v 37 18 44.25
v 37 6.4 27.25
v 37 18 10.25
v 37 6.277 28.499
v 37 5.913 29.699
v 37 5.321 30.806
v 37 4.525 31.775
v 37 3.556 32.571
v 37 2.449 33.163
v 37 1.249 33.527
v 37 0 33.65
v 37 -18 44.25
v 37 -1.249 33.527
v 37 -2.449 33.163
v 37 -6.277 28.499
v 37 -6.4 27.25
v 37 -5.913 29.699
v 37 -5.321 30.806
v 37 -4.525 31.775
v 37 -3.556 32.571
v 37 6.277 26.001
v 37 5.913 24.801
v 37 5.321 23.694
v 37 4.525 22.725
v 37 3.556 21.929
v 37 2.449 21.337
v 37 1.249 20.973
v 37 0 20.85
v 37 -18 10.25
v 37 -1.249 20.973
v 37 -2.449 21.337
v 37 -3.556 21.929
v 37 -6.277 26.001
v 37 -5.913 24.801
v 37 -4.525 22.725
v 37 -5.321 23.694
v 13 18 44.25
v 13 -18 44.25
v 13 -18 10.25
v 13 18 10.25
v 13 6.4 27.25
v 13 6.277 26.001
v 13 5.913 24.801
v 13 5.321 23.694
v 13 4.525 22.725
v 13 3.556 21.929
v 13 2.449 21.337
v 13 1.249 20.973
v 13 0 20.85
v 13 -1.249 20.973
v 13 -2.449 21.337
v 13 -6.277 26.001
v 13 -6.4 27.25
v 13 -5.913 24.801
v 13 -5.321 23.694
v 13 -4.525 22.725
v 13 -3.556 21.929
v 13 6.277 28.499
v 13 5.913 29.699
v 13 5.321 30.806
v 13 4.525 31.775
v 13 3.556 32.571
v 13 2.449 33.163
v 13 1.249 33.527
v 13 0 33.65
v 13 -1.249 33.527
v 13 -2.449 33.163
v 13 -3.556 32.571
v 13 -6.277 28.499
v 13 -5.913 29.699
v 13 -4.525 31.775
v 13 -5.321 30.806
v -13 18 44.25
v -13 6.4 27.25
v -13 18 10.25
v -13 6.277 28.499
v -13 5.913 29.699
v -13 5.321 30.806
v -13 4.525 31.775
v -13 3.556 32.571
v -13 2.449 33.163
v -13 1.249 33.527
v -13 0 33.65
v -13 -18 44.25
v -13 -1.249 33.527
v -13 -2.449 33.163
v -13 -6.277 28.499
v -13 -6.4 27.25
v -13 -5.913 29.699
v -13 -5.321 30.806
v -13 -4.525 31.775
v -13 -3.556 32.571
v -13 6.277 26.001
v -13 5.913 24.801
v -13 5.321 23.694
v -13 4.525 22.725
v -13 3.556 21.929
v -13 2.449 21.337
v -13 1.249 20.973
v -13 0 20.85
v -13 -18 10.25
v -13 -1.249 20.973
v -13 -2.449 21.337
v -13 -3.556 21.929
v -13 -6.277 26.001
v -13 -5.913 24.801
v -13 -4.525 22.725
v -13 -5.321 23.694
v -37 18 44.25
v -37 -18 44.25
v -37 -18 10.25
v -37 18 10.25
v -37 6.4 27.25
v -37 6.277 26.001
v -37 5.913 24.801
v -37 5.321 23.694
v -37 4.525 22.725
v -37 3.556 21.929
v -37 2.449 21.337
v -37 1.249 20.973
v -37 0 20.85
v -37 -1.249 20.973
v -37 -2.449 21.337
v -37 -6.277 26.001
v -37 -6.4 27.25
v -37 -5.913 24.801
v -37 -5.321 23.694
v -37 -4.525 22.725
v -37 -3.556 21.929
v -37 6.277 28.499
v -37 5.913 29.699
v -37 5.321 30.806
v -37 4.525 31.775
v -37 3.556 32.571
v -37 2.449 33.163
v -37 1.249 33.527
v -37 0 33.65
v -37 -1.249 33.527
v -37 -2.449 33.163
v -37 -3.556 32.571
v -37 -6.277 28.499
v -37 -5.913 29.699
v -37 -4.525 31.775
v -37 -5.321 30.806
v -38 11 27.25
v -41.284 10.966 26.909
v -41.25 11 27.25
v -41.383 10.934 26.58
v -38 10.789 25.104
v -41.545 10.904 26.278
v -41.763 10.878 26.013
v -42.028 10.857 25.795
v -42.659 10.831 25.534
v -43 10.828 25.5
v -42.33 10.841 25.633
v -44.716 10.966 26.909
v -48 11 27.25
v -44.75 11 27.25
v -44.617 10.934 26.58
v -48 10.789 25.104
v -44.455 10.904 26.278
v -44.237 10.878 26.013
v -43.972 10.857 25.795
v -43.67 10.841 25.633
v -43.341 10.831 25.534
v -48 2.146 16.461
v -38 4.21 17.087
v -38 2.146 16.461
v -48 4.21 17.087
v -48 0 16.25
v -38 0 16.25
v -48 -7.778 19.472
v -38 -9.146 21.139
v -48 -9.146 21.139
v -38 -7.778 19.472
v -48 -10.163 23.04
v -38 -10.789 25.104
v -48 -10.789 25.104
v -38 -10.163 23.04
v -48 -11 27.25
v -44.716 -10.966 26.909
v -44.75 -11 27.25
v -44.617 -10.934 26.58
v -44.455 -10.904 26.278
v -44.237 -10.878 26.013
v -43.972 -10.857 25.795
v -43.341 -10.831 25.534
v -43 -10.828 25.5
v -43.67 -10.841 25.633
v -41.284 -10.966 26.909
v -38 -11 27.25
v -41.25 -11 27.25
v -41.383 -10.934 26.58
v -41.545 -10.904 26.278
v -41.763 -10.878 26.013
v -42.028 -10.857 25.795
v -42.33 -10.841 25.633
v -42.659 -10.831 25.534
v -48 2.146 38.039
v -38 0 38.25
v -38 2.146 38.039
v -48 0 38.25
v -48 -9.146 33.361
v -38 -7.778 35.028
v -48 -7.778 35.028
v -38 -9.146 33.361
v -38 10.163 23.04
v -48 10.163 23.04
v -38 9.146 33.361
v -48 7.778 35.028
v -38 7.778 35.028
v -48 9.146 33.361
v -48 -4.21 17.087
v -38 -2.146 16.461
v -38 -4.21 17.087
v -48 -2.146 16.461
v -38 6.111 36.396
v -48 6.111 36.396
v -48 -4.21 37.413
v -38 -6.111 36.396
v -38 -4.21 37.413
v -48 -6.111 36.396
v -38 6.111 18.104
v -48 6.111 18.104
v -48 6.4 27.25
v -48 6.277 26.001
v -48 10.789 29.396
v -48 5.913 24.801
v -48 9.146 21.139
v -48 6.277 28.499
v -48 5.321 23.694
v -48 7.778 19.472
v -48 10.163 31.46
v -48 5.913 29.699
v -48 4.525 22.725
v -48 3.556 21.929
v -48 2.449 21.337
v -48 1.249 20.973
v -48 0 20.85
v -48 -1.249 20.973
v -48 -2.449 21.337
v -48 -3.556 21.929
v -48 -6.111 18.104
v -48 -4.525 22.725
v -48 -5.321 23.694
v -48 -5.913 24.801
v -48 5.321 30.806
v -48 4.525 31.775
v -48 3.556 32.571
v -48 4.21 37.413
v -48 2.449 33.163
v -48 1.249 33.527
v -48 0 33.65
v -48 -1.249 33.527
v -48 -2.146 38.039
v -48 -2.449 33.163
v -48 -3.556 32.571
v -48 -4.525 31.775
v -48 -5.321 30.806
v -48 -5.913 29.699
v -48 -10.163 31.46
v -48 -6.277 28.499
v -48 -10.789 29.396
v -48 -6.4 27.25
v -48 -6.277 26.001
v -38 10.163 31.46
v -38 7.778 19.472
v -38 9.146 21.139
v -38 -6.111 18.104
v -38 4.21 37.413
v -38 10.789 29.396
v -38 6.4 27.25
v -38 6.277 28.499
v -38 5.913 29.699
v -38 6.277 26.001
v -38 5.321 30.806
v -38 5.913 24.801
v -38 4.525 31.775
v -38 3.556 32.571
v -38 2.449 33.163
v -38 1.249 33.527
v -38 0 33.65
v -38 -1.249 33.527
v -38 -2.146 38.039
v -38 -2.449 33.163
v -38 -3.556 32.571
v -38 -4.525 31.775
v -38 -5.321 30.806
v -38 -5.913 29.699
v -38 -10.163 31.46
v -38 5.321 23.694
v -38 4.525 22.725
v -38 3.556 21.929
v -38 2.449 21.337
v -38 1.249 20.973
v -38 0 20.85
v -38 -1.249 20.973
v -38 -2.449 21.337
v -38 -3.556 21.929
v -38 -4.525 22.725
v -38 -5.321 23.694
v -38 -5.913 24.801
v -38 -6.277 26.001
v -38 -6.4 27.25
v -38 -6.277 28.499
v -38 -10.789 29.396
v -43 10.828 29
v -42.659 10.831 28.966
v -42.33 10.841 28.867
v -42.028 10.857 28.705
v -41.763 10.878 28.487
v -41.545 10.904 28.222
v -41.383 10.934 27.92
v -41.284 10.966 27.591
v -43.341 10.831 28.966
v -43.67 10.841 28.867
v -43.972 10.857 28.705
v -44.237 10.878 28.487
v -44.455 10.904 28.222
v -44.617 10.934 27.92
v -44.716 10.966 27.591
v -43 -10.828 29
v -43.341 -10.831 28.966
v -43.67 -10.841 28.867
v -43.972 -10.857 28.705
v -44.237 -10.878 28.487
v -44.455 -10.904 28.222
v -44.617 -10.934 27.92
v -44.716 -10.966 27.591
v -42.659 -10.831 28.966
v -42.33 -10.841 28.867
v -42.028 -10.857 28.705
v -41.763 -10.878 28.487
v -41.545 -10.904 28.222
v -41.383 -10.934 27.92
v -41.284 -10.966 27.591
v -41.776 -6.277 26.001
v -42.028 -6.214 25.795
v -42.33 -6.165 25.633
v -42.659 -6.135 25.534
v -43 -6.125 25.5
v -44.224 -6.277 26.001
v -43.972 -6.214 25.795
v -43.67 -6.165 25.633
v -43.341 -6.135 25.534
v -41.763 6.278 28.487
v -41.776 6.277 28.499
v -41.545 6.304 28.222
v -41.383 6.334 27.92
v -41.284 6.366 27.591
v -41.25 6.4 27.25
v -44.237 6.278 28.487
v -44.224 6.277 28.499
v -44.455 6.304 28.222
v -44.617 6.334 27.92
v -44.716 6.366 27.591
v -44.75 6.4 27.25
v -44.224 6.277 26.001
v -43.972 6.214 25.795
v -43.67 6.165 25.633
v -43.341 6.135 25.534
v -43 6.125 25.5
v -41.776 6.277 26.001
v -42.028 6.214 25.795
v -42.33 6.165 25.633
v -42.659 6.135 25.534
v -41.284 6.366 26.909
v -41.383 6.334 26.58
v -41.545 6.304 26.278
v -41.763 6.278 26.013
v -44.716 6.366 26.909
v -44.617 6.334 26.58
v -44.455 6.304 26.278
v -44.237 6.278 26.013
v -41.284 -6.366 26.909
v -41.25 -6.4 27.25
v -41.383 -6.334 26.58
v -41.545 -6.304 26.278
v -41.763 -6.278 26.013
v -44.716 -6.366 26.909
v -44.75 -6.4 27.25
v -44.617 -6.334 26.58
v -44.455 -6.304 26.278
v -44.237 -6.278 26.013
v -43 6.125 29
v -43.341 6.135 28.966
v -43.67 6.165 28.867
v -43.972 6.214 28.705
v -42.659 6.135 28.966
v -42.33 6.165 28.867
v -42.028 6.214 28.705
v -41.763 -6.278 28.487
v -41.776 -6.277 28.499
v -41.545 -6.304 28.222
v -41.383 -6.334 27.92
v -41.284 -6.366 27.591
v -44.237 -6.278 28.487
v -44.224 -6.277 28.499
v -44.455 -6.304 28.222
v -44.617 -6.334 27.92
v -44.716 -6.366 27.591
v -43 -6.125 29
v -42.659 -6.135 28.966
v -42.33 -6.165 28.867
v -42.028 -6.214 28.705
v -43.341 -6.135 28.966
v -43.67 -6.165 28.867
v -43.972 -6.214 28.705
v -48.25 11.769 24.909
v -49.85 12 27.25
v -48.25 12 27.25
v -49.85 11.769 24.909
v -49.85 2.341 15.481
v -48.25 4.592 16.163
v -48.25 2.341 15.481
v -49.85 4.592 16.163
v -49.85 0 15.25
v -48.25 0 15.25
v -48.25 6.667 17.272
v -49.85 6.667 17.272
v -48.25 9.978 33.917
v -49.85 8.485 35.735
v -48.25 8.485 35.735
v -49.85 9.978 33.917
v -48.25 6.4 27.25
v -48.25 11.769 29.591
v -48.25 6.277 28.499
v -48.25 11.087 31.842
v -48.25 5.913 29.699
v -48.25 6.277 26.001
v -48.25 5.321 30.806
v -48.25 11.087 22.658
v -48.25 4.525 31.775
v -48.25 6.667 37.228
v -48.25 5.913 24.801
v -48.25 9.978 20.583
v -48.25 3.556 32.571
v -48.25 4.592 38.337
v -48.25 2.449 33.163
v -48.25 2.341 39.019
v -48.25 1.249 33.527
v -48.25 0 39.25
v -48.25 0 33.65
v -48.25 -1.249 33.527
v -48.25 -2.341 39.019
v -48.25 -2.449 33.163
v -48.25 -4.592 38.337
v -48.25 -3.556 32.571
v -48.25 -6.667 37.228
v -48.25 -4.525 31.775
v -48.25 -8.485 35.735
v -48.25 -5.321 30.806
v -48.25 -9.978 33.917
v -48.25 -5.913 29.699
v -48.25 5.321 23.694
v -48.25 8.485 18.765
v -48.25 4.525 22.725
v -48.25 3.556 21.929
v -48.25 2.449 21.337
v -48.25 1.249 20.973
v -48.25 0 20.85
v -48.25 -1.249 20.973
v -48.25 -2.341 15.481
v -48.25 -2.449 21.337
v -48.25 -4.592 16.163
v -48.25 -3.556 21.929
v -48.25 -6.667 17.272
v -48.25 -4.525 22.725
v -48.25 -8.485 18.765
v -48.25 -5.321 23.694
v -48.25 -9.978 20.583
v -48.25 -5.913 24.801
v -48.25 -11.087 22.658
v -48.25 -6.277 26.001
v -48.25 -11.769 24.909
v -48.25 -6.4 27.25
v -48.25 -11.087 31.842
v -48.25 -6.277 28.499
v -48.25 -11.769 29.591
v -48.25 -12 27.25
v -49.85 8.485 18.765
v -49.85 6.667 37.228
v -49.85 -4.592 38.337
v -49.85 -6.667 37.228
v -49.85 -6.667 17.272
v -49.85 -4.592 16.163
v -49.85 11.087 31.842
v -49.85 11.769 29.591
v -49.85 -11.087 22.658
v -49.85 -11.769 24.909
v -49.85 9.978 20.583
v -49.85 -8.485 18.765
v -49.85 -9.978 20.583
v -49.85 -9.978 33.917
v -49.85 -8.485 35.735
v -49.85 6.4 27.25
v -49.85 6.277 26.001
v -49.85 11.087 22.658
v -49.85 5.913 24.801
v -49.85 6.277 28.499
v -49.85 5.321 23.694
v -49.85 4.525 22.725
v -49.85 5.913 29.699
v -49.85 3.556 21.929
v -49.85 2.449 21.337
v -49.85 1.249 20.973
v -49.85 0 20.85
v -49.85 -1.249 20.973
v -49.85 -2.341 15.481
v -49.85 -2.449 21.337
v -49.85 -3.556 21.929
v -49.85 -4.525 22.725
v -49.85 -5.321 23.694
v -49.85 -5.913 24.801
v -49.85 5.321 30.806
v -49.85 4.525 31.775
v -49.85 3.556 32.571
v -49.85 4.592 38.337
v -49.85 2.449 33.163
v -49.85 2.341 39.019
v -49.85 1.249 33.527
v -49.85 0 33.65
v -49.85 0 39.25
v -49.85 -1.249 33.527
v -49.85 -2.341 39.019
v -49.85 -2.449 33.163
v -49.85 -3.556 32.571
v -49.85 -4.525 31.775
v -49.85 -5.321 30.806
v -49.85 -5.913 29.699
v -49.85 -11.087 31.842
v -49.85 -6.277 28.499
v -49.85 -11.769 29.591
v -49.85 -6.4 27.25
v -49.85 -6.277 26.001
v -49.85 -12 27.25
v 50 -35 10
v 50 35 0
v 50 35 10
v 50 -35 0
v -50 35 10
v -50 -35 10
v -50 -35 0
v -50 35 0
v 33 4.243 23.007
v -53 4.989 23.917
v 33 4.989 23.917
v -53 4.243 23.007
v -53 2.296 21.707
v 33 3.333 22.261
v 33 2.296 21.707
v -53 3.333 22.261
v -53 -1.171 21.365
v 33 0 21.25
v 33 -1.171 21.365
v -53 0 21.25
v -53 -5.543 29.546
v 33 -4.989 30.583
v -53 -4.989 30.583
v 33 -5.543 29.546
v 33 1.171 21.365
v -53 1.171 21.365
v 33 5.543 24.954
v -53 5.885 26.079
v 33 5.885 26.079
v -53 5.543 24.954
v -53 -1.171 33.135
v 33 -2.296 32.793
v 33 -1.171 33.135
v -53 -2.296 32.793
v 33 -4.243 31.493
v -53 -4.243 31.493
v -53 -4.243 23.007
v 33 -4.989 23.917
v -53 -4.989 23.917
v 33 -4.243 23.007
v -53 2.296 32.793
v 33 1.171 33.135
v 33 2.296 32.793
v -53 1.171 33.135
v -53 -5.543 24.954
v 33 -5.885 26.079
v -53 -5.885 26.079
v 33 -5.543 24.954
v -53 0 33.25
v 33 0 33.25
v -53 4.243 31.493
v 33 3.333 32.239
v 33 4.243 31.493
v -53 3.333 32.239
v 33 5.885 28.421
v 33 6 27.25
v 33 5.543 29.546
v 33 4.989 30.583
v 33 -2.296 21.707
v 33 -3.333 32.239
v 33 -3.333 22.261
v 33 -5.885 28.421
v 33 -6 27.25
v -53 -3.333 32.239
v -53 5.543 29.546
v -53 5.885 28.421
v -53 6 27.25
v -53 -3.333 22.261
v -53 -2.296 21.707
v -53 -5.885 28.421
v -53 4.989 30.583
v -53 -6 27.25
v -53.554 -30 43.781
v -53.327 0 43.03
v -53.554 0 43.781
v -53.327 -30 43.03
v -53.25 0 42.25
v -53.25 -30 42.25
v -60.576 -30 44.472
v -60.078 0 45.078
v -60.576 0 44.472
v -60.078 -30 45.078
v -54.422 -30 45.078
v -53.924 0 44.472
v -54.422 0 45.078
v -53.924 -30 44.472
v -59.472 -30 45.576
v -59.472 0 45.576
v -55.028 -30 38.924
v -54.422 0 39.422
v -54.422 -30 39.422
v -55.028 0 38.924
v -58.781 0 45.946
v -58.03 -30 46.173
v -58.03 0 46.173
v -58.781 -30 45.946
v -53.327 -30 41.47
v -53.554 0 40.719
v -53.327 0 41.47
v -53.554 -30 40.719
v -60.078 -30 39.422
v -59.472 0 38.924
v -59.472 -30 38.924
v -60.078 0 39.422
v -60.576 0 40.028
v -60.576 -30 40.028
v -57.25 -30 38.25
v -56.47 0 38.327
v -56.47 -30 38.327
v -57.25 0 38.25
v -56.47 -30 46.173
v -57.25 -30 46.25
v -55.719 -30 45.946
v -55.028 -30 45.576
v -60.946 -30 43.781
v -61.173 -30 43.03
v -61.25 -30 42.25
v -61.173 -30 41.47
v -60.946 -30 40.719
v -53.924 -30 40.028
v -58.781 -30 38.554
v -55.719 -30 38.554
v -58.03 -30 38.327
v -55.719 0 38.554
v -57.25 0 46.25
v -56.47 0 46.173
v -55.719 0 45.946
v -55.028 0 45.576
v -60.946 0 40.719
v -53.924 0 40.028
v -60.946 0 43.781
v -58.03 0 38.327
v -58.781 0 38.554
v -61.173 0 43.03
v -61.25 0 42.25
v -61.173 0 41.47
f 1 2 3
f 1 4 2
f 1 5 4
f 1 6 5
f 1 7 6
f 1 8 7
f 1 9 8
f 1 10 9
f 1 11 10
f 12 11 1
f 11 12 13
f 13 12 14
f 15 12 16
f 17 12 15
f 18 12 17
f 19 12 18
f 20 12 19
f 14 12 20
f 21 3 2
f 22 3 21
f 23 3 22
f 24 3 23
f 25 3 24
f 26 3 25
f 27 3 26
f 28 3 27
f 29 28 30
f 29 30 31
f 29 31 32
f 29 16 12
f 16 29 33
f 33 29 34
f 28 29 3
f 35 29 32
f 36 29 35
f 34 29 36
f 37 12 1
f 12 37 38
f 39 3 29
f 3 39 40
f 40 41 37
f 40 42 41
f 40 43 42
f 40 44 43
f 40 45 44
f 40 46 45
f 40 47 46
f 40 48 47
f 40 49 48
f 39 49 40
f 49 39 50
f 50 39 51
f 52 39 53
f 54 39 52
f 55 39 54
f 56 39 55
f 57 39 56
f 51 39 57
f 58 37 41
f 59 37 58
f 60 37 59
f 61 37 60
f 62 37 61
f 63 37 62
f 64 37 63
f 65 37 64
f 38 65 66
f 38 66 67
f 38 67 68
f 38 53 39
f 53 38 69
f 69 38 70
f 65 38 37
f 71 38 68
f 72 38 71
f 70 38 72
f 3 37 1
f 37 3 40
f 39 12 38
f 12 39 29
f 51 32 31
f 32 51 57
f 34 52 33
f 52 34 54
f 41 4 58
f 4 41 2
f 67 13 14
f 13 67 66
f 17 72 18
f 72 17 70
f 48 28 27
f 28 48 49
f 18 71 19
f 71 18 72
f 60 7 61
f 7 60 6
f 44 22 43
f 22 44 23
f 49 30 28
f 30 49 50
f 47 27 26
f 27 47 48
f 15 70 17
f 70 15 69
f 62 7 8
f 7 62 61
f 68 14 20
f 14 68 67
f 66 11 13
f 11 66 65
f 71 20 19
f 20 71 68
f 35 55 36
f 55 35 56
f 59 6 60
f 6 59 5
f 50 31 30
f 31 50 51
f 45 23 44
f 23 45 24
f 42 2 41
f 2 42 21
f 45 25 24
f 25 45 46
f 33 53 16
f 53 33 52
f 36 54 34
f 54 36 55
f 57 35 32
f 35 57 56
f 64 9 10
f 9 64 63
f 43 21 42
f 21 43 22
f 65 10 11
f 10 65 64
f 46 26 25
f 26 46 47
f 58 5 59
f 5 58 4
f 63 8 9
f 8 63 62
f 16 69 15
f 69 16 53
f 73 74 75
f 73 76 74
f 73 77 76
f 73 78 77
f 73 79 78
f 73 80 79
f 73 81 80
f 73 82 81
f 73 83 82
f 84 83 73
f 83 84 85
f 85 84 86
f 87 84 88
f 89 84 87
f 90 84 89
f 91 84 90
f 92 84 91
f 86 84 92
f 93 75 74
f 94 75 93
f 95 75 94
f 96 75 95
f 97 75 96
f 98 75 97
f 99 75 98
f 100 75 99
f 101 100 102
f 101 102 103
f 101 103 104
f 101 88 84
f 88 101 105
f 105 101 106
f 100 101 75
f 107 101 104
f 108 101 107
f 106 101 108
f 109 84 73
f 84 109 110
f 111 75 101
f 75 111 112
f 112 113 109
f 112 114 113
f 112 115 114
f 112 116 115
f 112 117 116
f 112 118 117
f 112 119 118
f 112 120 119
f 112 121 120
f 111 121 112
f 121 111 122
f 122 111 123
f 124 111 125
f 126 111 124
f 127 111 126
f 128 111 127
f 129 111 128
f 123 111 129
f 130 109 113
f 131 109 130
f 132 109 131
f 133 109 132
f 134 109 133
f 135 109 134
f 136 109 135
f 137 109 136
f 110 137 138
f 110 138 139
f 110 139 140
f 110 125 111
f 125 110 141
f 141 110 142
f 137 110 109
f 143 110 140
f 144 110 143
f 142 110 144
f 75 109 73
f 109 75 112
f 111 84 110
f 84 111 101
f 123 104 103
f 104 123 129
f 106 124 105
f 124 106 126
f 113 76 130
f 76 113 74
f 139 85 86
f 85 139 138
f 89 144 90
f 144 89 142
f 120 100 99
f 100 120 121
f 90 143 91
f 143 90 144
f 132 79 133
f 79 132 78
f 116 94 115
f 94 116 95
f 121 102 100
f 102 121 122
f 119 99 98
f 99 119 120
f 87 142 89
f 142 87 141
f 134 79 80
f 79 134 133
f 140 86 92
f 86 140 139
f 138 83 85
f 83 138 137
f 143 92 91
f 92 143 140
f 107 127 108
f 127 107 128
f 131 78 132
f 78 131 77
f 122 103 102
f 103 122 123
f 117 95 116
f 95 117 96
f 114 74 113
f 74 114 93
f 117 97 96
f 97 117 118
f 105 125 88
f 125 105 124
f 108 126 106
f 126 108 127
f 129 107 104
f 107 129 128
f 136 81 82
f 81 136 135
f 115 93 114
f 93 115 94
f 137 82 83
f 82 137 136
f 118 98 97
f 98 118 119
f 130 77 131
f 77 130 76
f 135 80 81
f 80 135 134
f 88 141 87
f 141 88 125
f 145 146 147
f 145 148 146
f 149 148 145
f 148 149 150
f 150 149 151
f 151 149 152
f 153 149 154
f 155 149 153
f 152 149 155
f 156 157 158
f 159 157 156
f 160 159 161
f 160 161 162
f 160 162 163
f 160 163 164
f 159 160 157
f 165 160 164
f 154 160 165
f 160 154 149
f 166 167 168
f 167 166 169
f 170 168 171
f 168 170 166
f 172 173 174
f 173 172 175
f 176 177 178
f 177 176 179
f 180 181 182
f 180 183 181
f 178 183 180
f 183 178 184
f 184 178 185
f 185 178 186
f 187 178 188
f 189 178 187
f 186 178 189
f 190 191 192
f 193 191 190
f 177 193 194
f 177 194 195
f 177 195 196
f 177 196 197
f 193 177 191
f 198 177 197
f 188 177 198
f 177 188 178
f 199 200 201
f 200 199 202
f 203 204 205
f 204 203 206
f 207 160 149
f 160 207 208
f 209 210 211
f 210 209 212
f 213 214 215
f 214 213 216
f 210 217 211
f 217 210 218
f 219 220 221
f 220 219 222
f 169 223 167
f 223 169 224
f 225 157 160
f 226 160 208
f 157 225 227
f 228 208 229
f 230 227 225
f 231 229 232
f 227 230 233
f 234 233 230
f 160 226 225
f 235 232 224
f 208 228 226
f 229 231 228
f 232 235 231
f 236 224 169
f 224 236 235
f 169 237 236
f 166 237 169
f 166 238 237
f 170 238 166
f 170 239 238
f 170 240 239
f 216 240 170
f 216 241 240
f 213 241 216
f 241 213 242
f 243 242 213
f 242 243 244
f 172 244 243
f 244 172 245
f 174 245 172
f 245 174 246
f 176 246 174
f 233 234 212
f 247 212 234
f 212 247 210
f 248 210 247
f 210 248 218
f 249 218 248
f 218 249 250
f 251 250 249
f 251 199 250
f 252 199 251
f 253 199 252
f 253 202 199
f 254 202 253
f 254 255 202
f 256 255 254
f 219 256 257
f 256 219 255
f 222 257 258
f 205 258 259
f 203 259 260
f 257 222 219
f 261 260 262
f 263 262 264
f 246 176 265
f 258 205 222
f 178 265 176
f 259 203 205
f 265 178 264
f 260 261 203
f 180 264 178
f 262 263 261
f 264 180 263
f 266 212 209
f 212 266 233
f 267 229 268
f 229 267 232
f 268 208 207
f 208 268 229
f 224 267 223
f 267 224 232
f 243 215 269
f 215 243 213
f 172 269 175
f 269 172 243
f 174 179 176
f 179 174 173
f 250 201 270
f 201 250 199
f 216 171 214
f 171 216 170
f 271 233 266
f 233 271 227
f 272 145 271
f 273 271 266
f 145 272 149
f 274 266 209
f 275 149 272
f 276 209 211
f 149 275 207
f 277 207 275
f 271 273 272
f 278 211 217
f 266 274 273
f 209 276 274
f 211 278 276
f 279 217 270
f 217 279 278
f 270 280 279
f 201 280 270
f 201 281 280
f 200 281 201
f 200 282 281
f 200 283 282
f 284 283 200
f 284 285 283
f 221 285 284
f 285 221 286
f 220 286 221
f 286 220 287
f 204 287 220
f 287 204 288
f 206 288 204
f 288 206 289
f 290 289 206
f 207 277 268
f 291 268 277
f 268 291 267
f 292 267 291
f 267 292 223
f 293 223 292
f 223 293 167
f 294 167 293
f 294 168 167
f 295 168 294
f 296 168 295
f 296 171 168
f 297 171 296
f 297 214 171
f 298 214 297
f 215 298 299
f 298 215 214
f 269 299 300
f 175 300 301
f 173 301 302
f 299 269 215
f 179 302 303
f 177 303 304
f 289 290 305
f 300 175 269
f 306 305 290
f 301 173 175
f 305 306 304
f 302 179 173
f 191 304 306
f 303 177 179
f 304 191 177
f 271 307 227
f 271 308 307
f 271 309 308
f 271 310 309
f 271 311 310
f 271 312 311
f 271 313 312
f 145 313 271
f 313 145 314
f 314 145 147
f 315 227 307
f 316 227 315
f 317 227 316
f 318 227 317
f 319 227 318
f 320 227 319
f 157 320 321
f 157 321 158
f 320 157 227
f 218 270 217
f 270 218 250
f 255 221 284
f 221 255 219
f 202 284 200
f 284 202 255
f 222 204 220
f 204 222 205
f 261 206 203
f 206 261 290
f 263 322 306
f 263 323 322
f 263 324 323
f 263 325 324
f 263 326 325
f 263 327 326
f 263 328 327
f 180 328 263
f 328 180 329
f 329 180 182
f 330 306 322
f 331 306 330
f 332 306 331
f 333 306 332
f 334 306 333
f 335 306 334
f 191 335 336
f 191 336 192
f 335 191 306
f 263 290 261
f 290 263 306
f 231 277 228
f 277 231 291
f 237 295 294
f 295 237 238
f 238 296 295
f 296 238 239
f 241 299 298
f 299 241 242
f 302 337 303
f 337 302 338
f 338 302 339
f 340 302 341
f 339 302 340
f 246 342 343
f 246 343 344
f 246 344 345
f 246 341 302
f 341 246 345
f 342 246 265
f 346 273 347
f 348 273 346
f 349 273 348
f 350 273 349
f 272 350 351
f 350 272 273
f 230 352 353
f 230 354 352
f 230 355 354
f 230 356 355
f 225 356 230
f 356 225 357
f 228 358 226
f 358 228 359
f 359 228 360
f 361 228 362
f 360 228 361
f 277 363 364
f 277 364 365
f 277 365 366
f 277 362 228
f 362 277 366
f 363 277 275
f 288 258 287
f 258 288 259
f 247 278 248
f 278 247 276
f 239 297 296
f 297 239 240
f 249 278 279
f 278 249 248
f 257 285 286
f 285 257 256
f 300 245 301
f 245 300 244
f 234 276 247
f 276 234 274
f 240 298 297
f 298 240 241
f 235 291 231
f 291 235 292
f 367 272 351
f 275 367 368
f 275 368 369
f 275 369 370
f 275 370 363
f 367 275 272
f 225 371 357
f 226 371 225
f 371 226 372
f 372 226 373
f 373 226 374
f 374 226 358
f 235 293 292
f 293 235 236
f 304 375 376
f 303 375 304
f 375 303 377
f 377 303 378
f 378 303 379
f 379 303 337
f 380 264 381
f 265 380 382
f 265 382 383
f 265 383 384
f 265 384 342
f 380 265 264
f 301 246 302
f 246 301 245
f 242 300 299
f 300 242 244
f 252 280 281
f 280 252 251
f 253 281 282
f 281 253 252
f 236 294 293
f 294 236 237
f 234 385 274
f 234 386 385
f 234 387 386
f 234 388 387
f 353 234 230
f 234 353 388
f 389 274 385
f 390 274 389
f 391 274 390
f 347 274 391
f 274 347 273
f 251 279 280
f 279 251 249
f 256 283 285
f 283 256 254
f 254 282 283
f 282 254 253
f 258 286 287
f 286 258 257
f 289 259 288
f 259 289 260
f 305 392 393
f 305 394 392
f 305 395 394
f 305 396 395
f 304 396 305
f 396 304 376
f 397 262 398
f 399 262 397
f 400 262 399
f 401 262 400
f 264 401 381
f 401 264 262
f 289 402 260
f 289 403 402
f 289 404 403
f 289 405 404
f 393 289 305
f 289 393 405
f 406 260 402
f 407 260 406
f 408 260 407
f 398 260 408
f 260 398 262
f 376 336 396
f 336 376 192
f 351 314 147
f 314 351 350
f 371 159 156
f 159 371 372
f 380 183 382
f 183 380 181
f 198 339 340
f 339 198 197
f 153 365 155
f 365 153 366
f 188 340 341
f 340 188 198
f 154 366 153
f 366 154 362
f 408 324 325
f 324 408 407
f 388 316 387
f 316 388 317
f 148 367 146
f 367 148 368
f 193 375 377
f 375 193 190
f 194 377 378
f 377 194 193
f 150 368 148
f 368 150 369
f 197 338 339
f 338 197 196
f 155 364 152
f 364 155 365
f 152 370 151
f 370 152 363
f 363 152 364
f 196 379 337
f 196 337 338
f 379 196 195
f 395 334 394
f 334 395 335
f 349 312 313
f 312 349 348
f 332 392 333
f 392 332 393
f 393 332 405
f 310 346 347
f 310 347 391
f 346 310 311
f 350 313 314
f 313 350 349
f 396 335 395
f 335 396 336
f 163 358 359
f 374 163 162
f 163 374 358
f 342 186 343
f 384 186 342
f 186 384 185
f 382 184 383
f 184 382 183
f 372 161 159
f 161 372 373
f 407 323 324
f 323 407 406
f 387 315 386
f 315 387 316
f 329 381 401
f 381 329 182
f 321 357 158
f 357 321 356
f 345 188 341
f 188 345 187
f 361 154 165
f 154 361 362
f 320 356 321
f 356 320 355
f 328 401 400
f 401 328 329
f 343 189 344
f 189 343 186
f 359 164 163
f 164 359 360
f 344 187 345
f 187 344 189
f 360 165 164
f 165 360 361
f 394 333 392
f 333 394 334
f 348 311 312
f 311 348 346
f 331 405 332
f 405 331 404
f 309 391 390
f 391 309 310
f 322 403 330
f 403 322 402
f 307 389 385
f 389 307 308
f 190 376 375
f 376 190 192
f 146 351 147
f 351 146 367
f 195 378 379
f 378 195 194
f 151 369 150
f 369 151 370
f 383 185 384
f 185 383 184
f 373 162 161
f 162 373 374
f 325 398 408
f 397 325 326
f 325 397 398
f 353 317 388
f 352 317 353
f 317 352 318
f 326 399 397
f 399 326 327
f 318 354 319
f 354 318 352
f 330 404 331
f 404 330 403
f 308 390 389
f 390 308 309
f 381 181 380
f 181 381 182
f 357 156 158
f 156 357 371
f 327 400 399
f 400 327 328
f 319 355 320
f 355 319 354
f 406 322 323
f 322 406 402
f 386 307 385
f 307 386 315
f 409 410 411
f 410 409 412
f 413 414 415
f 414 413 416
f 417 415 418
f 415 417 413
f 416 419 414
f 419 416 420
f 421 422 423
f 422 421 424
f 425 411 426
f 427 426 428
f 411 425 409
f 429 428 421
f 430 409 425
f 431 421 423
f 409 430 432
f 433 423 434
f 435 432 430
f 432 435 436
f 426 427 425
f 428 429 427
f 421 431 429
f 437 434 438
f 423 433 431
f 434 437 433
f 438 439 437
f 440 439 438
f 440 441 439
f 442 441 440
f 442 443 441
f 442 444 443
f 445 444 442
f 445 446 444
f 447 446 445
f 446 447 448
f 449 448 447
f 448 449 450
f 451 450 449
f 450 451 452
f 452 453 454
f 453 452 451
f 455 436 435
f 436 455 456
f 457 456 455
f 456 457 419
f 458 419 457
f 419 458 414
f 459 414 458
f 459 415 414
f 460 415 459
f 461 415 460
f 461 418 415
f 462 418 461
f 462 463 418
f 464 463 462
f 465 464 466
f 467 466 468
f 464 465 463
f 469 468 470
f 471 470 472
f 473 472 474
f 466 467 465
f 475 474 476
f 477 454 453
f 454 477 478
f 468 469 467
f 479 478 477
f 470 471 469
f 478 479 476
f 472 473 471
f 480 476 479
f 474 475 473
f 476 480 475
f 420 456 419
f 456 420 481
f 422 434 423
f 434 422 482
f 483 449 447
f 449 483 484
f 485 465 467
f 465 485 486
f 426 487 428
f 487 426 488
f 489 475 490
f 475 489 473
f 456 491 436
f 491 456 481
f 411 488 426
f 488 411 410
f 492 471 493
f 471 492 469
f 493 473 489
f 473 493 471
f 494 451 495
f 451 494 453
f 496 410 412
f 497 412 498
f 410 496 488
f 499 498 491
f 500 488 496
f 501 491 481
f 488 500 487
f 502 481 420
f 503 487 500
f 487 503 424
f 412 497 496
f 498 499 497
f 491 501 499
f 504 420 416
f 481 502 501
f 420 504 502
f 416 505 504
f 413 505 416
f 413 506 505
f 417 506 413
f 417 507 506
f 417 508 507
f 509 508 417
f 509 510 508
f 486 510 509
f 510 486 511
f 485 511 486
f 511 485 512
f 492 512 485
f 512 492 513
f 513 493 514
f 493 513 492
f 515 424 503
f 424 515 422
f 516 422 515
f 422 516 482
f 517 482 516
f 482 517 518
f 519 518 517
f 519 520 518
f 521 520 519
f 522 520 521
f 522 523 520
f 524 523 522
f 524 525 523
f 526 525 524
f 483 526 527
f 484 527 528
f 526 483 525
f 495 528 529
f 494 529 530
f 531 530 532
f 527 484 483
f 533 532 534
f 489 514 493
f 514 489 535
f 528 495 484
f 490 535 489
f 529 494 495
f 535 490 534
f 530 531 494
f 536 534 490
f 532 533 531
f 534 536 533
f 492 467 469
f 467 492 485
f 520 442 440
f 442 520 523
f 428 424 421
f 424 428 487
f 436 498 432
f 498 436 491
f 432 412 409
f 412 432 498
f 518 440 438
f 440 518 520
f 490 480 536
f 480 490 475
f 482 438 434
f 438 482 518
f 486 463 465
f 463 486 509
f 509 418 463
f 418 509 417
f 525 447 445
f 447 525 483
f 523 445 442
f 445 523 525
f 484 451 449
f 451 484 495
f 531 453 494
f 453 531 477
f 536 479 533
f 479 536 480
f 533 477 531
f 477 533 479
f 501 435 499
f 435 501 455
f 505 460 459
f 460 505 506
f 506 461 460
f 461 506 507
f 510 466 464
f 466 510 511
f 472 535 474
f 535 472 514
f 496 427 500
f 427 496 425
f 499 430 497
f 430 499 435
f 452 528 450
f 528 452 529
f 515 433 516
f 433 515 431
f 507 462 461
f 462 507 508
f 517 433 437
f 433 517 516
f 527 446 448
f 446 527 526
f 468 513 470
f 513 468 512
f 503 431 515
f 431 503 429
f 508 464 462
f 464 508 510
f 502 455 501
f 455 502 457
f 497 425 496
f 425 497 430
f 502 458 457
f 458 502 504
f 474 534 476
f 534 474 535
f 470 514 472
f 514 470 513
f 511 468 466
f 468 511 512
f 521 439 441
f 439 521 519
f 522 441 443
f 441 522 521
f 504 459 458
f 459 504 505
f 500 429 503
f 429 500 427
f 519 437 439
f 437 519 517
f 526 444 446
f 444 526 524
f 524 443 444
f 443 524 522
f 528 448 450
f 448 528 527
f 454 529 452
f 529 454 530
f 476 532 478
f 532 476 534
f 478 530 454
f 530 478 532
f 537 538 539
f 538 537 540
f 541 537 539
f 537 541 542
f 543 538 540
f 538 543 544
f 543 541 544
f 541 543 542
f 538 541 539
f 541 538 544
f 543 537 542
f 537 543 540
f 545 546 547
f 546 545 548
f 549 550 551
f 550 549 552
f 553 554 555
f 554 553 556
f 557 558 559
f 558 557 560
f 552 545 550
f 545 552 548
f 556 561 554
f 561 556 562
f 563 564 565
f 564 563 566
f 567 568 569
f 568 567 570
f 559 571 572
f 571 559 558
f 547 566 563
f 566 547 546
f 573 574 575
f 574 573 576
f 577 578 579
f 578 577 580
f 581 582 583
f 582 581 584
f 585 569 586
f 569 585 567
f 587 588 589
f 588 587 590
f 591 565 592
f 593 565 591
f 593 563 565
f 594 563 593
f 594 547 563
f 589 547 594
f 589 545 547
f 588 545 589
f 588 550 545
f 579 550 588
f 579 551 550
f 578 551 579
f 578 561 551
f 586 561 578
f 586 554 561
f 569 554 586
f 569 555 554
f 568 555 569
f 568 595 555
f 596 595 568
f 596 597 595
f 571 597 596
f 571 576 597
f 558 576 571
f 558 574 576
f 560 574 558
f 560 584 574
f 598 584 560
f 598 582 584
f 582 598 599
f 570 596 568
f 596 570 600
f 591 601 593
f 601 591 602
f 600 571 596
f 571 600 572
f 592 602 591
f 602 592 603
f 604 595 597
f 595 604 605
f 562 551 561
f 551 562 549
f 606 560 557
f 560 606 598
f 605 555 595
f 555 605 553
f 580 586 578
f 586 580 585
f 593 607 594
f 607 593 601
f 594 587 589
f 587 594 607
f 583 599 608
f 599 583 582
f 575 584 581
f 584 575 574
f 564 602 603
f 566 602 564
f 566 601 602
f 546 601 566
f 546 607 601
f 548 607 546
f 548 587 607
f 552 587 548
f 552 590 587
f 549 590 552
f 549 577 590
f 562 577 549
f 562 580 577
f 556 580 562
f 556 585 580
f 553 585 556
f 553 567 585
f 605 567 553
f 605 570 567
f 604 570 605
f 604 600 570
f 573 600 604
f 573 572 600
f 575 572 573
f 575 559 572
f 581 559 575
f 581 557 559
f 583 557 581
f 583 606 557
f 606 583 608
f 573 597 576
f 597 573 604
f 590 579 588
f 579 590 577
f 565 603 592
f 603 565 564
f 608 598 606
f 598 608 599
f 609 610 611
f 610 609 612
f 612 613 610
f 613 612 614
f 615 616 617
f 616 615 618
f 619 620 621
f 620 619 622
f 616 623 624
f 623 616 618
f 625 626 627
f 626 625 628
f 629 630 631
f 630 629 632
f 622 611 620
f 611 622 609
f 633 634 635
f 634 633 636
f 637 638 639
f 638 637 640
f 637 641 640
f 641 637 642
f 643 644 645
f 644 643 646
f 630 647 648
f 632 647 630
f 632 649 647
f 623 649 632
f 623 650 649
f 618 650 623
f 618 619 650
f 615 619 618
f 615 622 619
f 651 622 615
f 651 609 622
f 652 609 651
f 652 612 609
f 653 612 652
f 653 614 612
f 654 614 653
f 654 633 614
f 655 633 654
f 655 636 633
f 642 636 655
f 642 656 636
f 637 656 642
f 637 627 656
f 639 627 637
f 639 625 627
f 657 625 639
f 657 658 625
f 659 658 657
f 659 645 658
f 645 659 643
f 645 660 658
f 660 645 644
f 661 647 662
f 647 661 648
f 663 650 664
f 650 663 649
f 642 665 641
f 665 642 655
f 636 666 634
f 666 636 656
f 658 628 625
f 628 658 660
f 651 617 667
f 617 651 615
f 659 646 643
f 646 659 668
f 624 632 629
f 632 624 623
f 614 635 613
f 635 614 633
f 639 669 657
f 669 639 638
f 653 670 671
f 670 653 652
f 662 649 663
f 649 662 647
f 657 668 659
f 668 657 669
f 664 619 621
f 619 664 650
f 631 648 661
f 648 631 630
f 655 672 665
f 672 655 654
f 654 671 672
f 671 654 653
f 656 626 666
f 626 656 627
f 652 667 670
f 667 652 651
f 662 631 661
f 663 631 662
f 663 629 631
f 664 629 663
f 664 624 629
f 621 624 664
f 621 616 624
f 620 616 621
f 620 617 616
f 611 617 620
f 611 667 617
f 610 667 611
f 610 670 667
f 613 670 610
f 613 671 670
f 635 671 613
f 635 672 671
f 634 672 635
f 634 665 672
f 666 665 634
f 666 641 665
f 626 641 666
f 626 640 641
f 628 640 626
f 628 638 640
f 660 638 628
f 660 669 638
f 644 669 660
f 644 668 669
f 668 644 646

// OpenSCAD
$fn = 32;

// ------------------------------------------------------------------------
// Machine vise: screw d12, jaws 24 x 34 mm
// Every part is its own module, assembly() places every instance.
// ------------------------------------------------------------------------

// --- part 1 ---
module vise_bed() {
  difference() {
    translate([-50, -35, 0]) cube([100, 70, 10]);
  }
}

// --- part 2 ---
module vise_jaw() {
  difference() {
    translate([-12, -18, 0]) cube([24, 36, 34]);
    translate([0, 0, 17]) rotate([0, 90, 0]) cylinder(h = 26, d = 12.8, center = true);
  }
}

// --- part 3 ---
module vise_screw() {
  translate([0, 0, -43]) cylinder(h = 86, d = 12);
}

// --- part 4 ---
module screw_collar() {
  difference() {
    cylinder(h = 10, d = 22);
    translate([0, 0, -1]) cylinder(h = 12, d = 12.8);
    translate([0, 0, 5]) rotate([90, 0, 0]) cylinder(h = 24, d = 3.5, center = true);
  }
}

// --- part 5 ---
module screw_washer() {
  difference() {
      translate([0, 0, 0]) cylinder(h = 1.6, d = 24);
      translate([0, 0, -1]) cylinder(h = 3.6, d = 12.8);
    }
}

// --- part 6 ---
module vise_handle() {
  cylinder(h = 30, d = 8);
}

// --- assembly ---
module assembly() {
  color([0.80, 0.24, 0.20]) translate([0, 0, 0]) rotate([0, 0, 0]) vise_bed();
  color([0.20, 0.45, 0.75]) translate([25, 0, 10.25]) rotate([0, 0, 0]) vise_jaw();
  color([0.25, 0.62, 0.32]) translate([-25, 0, 10.25]) rotate([0, 0, 0]) vise_jaw();
  color([0.92, 0.70, 0.18]) translate([-10, 0, 27.25]) rotate([0, 90, 0]) vise_screw();
  color([0.58, 0.35, 0.70]) translate([-48, 0, 27.25]) rotate([0, 90, 0]) screw_collar();
  color([0.16, 0.66, 0.66]) translate([-49.85, 0, 27.25]) rotate([0, 90, 0]) screw_washer();
  color([0.85, 0.48, 0.18]) translate([-57.25, 0, 42.25]) rotate([90, 0, 0]) vise_handle();
}

assembly();
